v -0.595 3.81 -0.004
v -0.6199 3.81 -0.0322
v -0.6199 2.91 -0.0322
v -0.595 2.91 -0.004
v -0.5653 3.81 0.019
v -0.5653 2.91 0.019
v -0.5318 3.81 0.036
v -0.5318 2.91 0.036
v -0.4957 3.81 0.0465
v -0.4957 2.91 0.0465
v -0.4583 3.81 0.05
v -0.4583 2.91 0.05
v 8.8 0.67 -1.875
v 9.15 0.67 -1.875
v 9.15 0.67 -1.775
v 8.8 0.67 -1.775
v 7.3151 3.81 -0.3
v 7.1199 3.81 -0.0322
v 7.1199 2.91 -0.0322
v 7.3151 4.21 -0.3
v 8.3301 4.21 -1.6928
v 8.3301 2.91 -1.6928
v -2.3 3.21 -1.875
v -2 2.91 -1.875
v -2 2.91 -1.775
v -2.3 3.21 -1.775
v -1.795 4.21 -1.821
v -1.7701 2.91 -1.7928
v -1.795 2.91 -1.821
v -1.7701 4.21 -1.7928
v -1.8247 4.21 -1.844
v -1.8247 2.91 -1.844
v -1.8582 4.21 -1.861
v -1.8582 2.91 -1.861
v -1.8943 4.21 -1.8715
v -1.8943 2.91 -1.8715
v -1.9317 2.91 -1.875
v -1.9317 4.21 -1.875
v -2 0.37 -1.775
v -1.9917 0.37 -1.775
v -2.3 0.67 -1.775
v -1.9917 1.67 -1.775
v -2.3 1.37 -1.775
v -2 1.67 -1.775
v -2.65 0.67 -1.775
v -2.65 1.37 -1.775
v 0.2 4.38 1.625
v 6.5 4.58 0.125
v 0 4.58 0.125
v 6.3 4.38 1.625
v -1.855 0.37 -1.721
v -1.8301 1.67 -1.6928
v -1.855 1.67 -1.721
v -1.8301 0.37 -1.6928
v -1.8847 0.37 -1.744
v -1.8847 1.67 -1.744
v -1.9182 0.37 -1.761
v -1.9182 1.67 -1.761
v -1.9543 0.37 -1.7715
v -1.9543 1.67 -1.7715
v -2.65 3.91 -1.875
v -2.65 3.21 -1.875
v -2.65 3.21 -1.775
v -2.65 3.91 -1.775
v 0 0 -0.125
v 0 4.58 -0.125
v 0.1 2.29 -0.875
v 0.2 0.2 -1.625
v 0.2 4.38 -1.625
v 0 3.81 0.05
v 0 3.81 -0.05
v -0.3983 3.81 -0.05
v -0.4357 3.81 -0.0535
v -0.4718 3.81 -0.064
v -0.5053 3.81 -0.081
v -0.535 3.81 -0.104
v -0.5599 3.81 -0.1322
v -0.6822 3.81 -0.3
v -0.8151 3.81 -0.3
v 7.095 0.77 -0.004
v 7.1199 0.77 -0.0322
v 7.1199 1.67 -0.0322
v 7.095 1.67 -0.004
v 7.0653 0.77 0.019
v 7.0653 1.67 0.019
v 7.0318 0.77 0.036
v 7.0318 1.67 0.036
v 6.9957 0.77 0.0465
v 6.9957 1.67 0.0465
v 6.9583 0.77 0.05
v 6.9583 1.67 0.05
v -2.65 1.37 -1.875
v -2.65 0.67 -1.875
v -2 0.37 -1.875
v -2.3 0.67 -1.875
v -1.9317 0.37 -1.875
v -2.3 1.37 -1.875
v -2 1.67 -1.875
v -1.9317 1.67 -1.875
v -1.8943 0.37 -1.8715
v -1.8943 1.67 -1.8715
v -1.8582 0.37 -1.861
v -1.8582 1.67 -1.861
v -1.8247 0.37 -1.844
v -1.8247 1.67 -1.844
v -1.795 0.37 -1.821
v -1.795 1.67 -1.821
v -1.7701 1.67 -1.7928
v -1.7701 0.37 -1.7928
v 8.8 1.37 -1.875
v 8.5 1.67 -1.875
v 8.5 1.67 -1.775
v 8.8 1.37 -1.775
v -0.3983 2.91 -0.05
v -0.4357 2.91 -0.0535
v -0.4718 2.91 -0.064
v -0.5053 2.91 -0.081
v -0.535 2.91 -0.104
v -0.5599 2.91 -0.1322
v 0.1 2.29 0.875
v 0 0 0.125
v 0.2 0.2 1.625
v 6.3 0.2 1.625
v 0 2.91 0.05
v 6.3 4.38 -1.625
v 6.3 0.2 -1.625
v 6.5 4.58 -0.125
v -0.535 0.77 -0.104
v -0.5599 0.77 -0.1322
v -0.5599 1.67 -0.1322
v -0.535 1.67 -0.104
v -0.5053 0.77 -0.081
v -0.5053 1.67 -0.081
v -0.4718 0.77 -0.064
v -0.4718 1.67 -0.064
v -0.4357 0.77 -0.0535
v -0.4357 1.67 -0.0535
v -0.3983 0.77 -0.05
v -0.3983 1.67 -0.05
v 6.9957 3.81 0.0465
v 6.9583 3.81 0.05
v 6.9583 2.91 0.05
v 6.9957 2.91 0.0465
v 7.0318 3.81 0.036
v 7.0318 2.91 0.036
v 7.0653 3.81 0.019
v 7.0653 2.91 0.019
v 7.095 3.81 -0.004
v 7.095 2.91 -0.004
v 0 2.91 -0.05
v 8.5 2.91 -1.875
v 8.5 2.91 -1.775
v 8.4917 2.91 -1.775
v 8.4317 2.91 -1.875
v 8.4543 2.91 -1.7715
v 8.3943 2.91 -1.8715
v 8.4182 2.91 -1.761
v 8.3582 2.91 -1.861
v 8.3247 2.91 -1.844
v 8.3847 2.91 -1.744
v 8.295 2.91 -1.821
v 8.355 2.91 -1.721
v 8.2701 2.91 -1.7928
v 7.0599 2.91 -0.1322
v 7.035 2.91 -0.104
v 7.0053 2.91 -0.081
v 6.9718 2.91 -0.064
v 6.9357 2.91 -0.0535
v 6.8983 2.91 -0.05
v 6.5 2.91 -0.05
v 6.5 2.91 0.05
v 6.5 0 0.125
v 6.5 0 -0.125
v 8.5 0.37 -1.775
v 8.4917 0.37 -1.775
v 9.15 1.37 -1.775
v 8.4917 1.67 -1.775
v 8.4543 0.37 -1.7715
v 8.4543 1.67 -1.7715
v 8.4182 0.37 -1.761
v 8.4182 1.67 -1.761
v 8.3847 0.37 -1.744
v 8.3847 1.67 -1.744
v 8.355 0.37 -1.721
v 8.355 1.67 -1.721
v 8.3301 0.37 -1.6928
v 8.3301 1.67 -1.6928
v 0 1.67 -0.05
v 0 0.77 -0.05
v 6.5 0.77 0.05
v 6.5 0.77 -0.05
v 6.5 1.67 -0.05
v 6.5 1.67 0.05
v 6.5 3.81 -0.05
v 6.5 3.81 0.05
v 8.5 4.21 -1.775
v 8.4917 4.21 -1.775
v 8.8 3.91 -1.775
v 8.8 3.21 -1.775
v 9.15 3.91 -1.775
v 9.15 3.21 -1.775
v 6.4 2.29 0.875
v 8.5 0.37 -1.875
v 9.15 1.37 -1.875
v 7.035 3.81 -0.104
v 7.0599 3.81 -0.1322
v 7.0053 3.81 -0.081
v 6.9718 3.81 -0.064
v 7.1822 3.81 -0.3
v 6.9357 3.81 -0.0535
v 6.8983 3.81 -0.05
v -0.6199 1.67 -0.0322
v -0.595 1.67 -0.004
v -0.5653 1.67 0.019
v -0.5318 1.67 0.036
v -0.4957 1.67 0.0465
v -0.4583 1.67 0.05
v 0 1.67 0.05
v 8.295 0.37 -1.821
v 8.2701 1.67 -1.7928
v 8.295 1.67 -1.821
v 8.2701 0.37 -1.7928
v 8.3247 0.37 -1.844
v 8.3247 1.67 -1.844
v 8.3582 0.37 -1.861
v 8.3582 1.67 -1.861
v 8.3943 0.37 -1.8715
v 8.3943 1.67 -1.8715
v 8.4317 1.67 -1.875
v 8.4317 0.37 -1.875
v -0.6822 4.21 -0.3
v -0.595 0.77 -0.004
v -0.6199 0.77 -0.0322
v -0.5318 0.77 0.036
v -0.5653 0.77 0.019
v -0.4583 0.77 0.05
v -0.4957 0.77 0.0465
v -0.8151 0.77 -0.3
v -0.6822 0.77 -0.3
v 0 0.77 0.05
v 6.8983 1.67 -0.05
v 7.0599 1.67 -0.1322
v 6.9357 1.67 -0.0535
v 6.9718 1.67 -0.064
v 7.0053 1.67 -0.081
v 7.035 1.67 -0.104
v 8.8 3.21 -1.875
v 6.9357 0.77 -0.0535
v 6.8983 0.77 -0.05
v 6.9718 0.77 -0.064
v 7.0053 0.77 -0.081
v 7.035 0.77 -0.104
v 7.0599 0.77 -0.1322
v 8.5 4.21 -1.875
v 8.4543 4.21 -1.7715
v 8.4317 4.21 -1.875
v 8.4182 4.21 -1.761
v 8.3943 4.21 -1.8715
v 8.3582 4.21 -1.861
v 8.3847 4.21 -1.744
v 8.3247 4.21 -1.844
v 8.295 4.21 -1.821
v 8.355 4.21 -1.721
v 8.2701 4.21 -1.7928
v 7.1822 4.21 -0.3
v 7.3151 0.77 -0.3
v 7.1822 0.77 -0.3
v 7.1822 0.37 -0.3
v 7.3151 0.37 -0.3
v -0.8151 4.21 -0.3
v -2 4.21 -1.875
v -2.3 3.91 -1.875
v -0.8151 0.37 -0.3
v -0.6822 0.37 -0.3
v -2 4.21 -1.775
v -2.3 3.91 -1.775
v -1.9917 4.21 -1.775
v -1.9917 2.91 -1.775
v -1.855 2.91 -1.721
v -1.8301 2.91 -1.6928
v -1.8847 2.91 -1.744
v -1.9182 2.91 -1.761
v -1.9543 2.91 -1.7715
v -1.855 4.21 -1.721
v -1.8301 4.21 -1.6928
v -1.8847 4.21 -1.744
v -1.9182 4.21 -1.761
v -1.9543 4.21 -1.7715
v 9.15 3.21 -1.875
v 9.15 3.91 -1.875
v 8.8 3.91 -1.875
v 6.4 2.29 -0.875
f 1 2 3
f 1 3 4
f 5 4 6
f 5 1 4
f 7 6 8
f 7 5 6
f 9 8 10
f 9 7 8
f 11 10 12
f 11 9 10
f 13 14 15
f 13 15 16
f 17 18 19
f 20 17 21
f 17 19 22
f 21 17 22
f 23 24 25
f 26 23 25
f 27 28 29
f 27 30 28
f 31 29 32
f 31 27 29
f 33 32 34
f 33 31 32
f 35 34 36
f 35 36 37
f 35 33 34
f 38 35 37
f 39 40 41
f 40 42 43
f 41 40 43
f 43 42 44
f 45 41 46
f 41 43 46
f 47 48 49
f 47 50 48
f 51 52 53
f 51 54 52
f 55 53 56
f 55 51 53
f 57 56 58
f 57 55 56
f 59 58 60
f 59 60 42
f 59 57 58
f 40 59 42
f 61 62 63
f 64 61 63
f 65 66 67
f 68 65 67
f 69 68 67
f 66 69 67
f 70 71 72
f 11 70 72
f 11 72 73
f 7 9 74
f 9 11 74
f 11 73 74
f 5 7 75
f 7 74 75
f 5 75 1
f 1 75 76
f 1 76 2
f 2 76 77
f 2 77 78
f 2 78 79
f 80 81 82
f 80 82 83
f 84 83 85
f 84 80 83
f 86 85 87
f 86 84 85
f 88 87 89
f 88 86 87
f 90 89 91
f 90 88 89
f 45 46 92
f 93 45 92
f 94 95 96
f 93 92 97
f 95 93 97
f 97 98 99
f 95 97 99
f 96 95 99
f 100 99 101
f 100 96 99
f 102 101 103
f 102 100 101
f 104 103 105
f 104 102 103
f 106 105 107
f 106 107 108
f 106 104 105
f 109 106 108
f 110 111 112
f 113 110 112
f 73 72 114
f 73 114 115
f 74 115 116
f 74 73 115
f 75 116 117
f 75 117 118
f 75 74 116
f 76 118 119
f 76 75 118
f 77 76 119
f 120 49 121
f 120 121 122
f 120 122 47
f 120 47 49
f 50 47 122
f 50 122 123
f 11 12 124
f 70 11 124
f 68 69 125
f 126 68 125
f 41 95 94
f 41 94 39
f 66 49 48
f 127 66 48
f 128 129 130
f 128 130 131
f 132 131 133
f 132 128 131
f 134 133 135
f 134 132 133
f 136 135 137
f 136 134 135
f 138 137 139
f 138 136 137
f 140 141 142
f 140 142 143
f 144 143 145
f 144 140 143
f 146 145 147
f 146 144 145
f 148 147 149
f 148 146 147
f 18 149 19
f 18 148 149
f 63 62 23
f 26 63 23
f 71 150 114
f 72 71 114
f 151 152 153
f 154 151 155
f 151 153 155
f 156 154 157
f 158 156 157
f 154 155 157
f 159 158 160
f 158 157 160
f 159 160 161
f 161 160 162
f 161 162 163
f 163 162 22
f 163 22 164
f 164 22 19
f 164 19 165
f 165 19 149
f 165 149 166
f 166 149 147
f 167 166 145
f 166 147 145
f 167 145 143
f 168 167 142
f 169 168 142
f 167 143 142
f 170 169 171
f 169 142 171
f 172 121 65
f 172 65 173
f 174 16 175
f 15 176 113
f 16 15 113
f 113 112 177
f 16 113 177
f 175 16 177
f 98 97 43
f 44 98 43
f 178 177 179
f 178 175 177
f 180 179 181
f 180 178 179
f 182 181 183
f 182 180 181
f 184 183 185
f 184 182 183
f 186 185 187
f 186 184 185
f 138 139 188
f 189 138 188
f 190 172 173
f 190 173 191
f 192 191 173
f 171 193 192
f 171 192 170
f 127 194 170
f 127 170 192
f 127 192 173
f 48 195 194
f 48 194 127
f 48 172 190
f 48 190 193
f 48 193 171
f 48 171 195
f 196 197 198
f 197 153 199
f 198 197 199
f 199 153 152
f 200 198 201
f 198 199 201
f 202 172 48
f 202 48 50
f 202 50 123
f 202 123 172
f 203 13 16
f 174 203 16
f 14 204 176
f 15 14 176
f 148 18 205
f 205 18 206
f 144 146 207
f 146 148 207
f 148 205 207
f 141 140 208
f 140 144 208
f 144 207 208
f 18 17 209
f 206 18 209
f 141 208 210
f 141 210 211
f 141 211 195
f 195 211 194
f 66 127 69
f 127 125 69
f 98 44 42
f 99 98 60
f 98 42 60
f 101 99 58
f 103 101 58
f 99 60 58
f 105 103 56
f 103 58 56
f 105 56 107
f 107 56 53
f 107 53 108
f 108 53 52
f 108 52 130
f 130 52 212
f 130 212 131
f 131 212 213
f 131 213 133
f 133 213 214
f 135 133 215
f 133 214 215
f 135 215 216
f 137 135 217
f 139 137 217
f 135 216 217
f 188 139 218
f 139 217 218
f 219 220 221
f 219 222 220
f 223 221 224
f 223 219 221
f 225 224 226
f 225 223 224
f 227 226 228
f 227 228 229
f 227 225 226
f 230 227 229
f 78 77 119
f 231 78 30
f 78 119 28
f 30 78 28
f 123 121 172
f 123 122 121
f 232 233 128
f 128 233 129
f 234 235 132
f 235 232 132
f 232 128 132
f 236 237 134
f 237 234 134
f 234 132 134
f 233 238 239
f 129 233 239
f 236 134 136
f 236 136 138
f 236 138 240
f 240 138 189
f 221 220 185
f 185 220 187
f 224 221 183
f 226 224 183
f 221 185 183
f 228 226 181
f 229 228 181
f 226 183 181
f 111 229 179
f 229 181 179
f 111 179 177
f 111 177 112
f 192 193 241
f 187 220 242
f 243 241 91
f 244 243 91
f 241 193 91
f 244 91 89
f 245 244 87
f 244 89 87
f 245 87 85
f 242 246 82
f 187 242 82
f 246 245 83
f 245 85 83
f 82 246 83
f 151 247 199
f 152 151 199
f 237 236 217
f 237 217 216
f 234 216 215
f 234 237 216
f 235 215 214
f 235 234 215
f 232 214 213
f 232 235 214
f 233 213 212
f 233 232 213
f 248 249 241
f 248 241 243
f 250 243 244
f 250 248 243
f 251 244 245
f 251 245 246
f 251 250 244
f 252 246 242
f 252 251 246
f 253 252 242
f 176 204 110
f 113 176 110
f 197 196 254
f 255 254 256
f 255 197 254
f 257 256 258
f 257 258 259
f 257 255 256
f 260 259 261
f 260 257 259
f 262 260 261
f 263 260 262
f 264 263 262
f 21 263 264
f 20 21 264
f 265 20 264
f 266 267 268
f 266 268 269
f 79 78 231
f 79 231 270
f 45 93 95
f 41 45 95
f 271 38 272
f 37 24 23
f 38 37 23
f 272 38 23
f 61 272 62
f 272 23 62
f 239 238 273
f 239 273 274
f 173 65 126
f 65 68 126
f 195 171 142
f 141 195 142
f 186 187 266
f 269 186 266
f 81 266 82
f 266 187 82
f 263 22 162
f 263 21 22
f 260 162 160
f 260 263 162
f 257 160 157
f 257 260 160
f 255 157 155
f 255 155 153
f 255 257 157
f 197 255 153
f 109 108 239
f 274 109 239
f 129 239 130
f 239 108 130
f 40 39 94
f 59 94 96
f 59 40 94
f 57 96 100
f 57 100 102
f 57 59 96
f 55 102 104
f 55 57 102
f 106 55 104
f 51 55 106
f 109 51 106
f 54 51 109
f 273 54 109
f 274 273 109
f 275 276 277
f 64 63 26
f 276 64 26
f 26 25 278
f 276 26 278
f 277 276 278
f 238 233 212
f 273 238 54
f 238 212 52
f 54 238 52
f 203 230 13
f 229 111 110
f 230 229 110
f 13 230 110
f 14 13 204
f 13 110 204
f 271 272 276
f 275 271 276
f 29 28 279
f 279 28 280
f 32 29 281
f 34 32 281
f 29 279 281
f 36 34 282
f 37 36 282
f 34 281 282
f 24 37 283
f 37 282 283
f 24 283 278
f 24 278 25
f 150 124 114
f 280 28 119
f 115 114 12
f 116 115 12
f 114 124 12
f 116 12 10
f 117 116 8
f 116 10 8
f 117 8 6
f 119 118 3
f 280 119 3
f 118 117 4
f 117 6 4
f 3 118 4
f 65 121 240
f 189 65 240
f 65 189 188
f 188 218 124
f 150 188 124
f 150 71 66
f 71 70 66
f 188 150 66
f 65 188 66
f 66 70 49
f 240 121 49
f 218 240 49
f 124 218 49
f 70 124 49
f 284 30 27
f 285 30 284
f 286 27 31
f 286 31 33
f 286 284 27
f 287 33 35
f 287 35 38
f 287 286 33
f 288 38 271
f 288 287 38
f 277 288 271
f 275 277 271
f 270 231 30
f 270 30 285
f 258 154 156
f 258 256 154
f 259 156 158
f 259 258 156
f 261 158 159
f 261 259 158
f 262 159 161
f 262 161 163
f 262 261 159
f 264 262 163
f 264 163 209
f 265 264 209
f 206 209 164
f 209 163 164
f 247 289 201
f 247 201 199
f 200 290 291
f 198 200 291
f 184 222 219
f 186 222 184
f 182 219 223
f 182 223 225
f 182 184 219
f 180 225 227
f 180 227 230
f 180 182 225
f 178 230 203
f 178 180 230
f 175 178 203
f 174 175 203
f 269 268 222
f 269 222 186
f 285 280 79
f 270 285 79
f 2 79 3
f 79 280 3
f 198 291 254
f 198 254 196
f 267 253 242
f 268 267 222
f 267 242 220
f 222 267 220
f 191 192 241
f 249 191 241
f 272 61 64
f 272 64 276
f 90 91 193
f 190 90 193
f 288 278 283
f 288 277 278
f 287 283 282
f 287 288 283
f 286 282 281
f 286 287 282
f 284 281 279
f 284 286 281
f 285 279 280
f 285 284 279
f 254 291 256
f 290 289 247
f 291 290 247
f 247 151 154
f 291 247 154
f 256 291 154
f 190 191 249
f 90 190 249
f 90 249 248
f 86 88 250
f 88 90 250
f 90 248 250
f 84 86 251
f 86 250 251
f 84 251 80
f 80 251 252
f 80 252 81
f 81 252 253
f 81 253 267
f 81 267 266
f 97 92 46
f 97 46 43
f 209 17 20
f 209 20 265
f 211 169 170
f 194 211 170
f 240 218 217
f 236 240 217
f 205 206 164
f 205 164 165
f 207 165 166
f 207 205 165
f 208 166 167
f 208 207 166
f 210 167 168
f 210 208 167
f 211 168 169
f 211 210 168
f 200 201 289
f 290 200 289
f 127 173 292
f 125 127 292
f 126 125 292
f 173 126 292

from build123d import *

# Parameters (mm, degrees)
BOX001_W               = 0.8
BOX001_H               = 0.8
BOX001_DEPTH           = 0.5
CHAMFER_SIZE           = 0.3
BOX_W                  = 10
BOX_H                  = 0.4
BOX_DEPTH              = 0.4
EXTRUDE001_DEPTH       = 1.3
FILLET_R               = 0.2
CUT005_PLACEMENT_ANGLE = 180
SKETCH_W               = 6.5
SKETCH_H               = 4.58
EXTRUDE_DEPTH          = 0.25
SKETCH001_W            = 6.1
SKETCH001_H            = 4.18


with BuildPart() as chamfer_body:
    # Box001 → Box001 (new body)
    with BuildSketch(Plane(origin=(-2.9, -0.2, -2), x_dir=(1, 0, 0), z_dir=(0, 0, 1))):
        with Locations((0.4, 0.4)):
            Rectangle(BOX001_W, BOX001_H)
    extrude(amount=BOX001_DEPTH)

    # Chamfer
    chamfer_edges = [chamfer_body.edges().sort_by_distance(p)[0] for p in [
        (-2.1, 0.6, -1.75),
    ]]
    chamfer(chamfer_edges, length=CHAMFER_SIZE)


with BuildPart() as chamfer_body_1:
    # Chamfer placement: moved
    add(chamfer_body.part.moved(Location((0.1, -0.1, 0))))


with BuildPart() as part_mirroring001:
    # Part__Mirroring001: instance of Chamfer body
    add(chamfer_body_1.part.mirror(Plane(origin=(0, 0.85, 0), x_dir=(1, 0, 0), z_dir=(0, 1, 0))))


with BuildPart() as part_mirroring002:
    # Part__Mirroring002: instance of Part__Mirroring001
    add(part_mirroring001.part.mirror(Plane(origin=(3.25, 0, 0), x_dir=(0, -1, 0), z_dir=(1, 0, 0))))


with BuildPart() as part_mirroring003:
    # Part__Mirroring003: instance of Part__Mirroring002
    add(part_mirroring002.part.mirror(Plane(origin=(0, 0.85, 0), x_dir=(1, 0, 0), z_dir=(0, 1, 0))))


with BuildPart() as cube:
    # Box → Box (new body)
    with BuildSketch(Plane(origin=(-1.5, 0.2, -0.3), x_dir=(1, 0, 0), z_dir=(0, 0, 1))):
        with Locations((5, 0.2)):
            Rectangle(BOX_W, BOX_H)
    extrude(amount=BOX_DEPTH)


with BuildPart() as cut003:
    # Sketch002 → Extrude001 (new body)
    with BuildSketch(Plane.XZ.offset(-0.2)):
        Polygon((-2.65, -1.875), (-1.83, -1.875), (-0.5, -0.05), (7, -0.05), (8.33, -1.875), (9.15, -1.875), (9.15, -1.775), (8.39, -1.775), (7.06, 0.05), (-0.56, 0.05), (-1.89, -1.775), (-2.65, -1.775), align=None)
    extrude(amount=EXTRUDE001_DEPTH)


with BuildPart() as cut003_1:
    # Extrude001 placement: moved
    add(cut003.part.moved(Location((0, 1.3, 0))))

    # Fillet
    fillet_edges = [cut003_1.edges().sort_by_distance(p)[0] for p in [
        (-1.83, 0.85, -1.875),
        (-0.5, 0.85, -0.05),
        (7, 0.85, -0.05),
        (8.33, 0.85, -1.875),
        (8.39, 0.85, -1.775),
        (7.06, 0.85, 0.05),
        (-0.56, 0.85, 0.05),
        (-1.89, 0.85, -1.775),
    ]]
    fillet(fillet_edges, radius=FILLET_R)

    # Cut: cut Cube
    add(cube.part, mode=Mode.SUBTRACT)

    # Cut001: cut Chamfer body
    add(chamfer_body_1.part, mode=Mode.SUBTRACT)

    # Cut002: cut Part__Mirroring001
    add(part_mirroring001.part, mode=Mode.SUBTRACT)

    # Cut003: cut Part__Mirroring002
    add(part_mirroring002.part, mode=Mode.SUBTRACT)


with BuildPart() as legs001:
    # Cut004 base: copy of Cut003
    add(cut003_1.part)

    # Cut004: cut Part__Mirroring003
    add(part_mirroring003.part, mode=Mode.SUBTRACT)


with BuildPart() as legs001_1:
    # Cut004 placement: moved
    add(legs001.part.moved(Location((0, 0.17, 0))))


with BuildPart() as legs002:
    # Cut005 base: copy of Cut003
    add(cut003_1.part)

    # Cut005: cut Part__Mirroring003
    add(part_mirroring003.part, mode=Mode.SUBTRACT)


with BuildPart() as legs002_1:
    # Cut005 placement: moved
    add(legs002.part.moved(Location((6.5, 4.41, 0))).rotate(Axis((6.5, 4.41, 0), (0, 0, 1)), CUT005_PLACEMENT_ANGLE))


with BuildPart() as extrude_body:
    # Sketch → Extrude (new body)
    with BuildSketch(Plane.XY.offset(0.125)):
        with Locations((3.25, 2.29)):
            Rectangle(SKETCH_W, SKETCH_H)
    extrude(amount=-EXTRUDE_DEPTH)


with BuildPart() as loft_body:
    # Sketch → Loft section 0
    with BuildSketch(Plane.XY.offset(0.125)):
        with Locations((3.25, 2.29)):
            Rectangle(SKETCH_W, SKETCH_H)
    # Sketch001 → Loft section 1
    with BuildSketch(Plane.XY.offset(1.625)):
        with Locations((3.25, 2.29)):
            Rectangle(SKETCH001_W, SKETCH001_H)
    loft()


with BuildPart() as part_mirroring:
    # Part__Mirroring: instance of Loft body
    add(loft_body.part.mirror(Plane(origin=(3.25, 2.29, 0), x_dir=(0, 1, 0), z_dir=(0, 0, 1))))


with BuildPart() as fusion001:
    # Fusion base: copy of Loft body
    add(loft_body.part)

    # Fusion: union Extrude body, Part__Mirroring
    add(extrude_body.part)
    add(part_mirroring.part)

    # Fusion001: union Legs001, Legs002
    add(legs001_1.part)
    add(legs002_1.part)


solid = fusion001.part
